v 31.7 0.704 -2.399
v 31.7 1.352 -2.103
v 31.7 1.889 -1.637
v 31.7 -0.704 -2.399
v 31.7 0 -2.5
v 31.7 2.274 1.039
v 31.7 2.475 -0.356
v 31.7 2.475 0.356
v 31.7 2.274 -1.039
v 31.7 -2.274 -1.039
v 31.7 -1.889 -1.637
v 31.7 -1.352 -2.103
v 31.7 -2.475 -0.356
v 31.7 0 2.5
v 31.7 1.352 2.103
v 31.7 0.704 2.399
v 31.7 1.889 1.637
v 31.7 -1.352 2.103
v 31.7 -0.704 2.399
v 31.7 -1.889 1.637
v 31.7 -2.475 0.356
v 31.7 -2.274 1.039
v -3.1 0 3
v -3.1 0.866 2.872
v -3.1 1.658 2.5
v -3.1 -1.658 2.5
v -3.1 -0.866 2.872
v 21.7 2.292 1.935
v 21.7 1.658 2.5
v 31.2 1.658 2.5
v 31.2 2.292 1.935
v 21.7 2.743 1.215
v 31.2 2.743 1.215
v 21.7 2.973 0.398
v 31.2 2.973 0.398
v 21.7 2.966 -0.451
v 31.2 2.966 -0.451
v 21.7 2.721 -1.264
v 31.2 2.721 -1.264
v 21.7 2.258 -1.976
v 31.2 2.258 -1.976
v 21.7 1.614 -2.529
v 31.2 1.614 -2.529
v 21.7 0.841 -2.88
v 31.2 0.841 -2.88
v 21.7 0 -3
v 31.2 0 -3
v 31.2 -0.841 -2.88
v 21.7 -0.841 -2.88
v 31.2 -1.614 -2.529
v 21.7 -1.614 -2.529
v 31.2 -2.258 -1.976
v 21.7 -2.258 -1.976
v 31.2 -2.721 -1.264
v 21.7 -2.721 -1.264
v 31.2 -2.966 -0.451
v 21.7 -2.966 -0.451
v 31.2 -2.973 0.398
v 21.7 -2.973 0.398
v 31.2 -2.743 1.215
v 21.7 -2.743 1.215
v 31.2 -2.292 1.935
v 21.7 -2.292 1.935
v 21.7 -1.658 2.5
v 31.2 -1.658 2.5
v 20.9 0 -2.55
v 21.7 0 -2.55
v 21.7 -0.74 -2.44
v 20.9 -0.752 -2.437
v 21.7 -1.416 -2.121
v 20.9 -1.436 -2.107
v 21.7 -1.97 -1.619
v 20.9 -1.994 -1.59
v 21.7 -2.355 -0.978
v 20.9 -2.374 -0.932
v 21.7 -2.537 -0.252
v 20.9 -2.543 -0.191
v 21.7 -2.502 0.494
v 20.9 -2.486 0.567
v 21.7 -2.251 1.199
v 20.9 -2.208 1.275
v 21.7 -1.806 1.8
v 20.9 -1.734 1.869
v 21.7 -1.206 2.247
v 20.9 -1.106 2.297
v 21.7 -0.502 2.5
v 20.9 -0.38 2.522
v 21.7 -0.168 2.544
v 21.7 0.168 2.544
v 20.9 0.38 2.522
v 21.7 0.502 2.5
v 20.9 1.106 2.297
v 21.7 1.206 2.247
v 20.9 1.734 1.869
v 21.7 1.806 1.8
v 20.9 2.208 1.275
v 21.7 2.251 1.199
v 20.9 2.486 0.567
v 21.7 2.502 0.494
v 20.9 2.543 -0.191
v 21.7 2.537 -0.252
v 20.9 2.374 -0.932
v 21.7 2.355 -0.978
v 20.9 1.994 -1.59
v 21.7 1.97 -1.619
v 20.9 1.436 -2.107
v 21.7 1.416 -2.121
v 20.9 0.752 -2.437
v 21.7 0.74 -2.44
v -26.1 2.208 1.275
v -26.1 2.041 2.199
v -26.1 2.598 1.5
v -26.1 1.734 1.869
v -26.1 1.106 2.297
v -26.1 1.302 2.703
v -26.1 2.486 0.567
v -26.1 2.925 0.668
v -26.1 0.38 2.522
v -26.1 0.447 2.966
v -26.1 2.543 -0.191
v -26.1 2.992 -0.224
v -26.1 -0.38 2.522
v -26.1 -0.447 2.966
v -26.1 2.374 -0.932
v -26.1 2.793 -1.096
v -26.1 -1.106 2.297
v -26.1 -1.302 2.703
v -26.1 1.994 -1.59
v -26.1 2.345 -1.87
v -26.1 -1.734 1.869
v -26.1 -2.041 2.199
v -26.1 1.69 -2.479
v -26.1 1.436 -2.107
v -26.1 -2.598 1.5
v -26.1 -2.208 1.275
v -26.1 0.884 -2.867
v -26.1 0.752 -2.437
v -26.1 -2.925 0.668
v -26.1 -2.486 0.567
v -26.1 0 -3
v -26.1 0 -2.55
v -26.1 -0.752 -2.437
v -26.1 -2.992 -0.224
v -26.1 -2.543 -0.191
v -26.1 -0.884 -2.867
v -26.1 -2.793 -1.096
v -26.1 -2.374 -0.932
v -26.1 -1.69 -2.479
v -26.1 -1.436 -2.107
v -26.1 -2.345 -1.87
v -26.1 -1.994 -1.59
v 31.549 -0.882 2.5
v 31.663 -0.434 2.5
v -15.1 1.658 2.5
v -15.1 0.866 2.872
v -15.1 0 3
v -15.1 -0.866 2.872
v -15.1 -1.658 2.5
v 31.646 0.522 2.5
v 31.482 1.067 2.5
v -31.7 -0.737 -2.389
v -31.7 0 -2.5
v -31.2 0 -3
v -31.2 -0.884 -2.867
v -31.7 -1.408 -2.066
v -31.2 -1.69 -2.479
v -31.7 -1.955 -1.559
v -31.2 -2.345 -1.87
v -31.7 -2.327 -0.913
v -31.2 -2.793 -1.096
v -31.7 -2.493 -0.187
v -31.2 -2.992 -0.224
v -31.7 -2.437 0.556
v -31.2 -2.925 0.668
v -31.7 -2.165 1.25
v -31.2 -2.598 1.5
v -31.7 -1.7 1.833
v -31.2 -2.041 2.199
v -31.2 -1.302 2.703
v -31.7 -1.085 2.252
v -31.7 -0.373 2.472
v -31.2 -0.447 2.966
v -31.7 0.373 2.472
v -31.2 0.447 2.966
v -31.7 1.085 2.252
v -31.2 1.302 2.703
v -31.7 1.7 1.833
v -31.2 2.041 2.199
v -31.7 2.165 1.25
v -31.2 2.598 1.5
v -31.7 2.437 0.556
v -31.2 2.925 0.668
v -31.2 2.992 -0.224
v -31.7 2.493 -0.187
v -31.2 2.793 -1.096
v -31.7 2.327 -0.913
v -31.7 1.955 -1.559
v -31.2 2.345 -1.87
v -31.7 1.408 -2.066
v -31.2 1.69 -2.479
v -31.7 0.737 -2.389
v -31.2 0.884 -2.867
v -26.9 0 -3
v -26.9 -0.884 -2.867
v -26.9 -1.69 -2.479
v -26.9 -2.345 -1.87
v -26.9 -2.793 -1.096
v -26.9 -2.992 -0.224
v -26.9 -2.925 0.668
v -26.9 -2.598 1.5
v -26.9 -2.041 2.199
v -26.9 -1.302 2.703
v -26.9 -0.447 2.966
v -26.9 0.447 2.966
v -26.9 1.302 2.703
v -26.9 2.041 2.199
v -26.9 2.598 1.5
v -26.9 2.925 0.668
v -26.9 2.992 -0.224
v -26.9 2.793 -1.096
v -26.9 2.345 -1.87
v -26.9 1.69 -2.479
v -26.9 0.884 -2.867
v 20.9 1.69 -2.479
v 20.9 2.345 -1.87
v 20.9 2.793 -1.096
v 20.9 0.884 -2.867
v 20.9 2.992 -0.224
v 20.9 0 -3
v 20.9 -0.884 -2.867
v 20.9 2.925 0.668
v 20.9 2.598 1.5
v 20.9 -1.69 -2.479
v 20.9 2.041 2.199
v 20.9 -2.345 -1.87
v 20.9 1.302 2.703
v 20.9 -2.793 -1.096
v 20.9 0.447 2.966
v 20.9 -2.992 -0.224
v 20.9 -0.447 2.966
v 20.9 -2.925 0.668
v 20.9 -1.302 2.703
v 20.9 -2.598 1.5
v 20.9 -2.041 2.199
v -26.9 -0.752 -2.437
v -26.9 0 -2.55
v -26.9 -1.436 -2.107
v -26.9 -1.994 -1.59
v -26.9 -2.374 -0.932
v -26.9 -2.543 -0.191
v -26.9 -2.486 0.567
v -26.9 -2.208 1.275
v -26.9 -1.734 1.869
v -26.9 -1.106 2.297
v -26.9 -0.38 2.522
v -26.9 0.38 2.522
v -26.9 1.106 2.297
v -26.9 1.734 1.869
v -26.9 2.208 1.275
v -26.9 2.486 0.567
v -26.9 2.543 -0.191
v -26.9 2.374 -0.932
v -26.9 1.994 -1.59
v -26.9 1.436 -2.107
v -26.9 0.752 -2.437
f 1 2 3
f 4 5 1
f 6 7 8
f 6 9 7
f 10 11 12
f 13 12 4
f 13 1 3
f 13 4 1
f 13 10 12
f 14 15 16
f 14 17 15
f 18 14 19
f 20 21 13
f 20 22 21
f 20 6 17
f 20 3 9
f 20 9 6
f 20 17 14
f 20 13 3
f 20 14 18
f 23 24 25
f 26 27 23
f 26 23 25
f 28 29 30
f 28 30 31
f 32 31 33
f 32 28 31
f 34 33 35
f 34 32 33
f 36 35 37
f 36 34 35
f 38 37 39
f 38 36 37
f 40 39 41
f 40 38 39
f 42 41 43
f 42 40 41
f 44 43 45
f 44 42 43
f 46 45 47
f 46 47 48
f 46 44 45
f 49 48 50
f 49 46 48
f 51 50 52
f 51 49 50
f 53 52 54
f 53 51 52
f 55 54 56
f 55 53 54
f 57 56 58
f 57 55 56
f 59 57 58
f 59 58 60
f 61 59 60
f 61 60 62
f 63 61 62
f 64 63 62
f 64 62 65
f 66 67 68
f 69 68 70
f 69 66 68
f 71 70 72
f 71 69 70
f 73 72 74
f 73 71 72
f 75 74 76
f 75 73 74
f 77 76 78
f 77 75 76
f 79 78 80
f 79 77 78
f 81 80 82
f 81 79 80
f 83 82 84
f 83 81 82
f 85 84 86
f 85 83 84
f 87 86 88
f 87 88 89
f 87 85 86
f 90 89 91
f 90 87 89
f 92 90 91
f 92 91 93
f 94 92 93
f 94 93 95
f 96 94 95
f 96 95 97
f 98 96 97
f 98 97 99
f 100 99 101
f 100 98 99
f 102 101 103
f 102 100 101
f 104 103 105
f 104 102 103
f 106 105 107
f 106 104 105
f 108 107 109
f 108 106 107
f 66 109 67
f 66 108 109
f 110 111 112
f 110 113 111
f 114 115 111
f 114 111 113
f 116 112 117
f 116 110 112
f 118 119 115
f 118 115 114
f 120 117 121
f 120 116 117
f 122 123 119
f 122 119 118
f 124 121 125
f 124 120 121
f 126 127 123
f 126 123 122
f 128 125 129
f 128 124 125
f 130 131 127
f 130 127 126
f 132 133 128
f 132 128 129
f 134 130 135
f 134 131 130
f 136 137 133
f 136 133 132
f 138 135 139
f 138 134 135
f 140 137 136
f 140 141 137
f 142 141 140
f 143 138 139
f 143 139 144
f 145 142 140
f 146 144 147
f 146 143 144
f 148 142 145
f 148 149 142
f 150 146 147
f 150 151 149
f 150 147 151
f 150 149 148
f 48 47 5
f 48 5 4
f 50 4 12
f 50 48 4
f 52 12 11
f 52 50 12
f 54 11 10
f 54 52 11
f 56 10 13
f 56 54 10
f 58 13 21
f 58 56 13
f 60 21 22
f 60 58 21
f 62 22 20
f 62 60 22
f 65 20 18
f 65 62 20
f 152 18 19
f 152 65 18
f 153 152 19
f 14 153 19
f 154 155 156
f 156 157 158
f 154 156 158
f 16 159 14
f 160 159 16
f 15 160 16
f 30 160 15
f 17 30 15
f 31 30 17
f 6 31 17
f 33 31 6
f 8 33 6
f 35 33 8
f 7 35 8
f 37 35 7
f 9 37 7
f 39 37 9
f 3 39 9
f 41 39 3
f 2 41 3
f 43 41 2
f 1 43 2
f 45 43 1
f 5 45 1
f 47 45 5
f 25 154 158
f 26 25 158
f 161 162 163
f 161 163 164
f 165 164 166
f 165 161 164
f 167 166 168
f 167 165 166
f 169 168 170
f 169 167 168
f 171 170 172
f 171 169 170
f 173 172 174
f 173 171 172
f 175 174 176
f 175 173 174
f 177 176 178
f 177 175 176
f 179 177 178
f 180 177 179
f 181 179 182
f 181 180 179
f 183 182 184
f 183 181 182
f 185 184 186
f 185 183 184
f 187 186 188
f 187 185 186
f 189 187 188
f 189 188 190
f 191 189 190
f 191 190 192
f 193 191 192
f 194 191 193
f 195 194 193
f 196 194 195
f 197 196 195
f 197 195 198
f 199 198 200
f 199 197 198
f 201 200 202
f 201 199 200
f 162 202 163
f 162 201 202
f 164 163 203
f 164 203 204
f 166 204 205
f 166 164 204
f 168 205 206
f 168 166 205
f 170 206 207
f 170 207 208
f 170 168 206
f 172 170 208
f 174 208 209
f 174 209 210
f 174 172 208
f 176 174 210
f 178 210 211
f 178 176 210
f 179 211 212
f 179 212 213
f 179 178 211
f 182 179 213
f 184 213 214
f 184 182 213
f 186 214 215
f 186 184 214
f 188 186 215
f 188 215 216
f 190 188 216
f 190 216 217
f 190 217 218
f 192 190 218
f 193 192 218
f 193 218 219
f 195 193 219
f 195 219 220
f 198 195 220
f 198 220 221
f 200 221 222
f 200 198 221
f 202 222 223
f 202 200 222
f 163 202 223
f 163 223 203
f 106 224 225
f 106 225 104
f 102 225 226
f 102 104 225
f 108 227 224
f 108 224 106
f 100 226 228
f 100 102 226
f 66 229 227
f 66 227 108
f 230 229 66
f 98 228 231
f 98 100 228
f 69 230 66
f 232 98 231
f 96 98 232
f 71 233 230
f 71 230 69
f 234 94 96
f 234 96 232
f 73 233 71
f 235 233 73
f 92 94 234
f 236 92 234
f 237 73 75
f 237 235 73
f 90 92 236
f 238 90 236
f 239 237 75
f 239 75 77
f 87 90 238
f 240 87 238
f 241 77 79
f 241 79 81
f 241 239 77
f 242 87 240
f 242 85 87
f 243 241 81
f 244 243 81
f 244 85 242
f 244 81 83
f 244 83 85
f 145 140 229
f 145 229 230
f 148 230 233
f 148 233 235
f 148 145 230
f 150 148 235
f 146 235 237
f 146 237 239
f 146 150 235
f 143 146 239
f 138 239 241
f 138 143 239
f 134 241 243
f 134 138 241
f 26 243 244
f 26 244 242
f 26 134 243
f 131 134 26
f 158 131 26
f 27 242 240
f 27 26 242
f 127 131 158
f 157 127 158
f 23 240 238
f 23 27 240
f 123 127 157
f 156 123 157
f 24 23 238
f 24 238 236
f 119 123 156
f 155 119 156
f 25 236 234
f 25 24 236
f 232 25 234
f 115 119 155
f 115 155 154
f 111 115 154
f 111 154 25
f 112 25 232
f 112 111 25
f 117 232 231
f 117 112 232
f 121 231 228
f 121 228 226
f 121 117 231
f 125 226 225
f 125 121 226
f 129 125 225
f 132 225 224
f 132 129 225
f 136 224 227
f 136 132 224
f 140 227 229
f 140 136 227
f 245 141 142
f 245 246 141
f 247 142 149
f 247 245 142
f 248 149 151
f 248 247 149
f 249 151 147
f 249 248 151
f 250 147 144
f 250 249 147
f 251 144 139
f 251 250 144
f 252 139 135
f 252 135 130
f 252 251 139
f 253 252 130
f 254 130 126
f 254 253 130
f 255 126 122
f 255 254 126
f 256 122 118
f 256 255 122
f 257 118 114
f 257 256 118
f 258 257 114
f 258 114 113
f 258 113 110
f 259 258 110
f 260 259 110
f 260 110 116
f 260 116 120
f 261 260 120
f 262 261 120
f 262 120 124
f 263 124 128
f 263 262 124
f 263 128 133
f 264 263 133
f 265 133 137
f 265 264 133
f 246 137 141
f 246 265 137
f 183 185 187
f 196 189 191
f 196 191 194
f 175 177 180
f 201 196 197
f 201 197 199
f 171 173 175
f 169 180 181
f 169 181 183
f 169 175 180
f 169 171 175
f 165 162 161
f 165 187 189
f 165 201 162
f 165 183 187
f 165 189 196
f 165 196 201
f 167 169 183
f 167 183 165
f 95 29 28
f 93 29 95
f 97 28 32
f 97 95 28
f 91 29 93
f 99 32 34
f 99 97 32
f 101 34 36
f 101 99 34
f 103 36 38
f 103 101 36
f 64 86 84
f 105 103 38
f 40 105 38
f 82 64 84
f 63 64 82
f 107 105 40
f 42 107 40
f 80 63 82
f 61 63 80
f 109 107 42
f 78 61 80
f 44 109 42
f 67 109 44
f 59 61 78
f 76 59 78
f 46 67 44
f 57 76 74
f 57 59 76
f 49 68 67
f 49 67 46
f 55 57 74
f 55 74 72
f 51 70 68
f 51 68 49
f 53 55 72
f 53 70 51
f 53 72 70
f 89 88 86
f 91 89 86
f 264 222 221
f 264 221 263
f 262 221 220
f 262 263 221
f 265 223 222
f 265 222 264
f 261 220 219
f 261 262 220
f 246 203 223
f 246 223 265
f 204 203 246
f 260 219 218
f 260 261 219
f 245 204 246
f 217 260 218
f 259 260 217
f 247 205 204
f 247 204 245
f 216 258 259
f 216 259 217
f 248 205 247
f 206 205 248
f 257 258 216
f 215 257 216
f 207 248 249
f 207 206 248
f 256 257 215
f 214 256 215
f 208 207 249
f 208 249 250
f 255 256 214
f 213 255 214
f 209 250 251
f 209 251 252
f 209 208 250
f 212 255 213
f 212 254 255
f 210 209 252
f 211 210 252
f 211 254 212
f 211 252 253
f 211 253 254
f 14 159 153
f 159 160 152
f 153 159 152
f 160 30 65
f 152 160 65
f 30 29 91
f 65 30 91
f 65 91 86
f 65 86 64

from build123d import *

# Parameters (mm, degrees)
CHAFL_N1_SIZE         = 0.5
CORTAR_EXTRUIR1_START = -10
CORTAR_EXTRUIR1_DEPTH = 10
CORTAR_EXTRUIR2_START = -46.8
CORTAR_EXTRUIR2_DEPTH = 12


with BuildPart() as part:
    # Croquis1 → Revolución1 (revolve)
    with BuildSketch(Plane(origin=(0, 0, 0), x_dir=(-1, 0, 0), z_dir=(0, 1, 0)), mode=Mode.PRIVATE) as revoluci_n1_sk:
        Polygon((-31.7, 0), (-31.7, 3), (-21.7, 3), (-21.7, 2.55), (-20.9, 2.55), (-20.9, 3), (26.1, 3), (26.1, 2.55), (26.9, 2.55), (26.9, 3), (31.7, 3), (31.7, 0), align=None)
    revolve(revoluci_n1_sk.sketch.rotate(Axis((31.7, 0, 0), (-1, 0, 0)), 180), axis=Axis((31.7, 0, 0), (-1, 0, 0)))

    # Chaflán1
    chafl_n1_edges = [part.edges().sort_by_distance(p)[0] for p in [
        (31.7, 0, 3),
        (-31.7, 0, 3),
    ]]
    chamfer(chafl_n1_edges, length=CHAFL_N1_SIZE)

    # Croquis2 → Cortar-Extruir1 (cut)
    with BuildSketch(Plane.YZ.offset(31.7).offset(CORTAR_EXTRUIR1_START)):
        with BuildLine():
            Line((1.658312395, 2.5), (-1.658312395, 2.5))
            ThreePointArc((-1.658312395, 2.5), (0, 3), (1.658312395, 2.5))
        make_face()
    extrude(amount=CORTAR_EXTRUIR1_DEPTH, mode=Mode.SUBTRACT)

    # Croquis2<2> → Cortar-Extruir2 (cut)
    with BuildSketch(Plane.YZ.offset(31.7).offset(CORTAR_EXTRUIR2_START)):
        with BuildLine():
            Line((1.658312395, 2.5), (-1.658312395, 2.5))
            ThreePointArc((-1.658312395, 2.5), (0, 3), (1.658312395, 2.5))
        make_face()
    extrude(amount=CORTAR_EXTRUIR2_DEPTH, mode=Mode.SUBTRACT)


solid = part.part
